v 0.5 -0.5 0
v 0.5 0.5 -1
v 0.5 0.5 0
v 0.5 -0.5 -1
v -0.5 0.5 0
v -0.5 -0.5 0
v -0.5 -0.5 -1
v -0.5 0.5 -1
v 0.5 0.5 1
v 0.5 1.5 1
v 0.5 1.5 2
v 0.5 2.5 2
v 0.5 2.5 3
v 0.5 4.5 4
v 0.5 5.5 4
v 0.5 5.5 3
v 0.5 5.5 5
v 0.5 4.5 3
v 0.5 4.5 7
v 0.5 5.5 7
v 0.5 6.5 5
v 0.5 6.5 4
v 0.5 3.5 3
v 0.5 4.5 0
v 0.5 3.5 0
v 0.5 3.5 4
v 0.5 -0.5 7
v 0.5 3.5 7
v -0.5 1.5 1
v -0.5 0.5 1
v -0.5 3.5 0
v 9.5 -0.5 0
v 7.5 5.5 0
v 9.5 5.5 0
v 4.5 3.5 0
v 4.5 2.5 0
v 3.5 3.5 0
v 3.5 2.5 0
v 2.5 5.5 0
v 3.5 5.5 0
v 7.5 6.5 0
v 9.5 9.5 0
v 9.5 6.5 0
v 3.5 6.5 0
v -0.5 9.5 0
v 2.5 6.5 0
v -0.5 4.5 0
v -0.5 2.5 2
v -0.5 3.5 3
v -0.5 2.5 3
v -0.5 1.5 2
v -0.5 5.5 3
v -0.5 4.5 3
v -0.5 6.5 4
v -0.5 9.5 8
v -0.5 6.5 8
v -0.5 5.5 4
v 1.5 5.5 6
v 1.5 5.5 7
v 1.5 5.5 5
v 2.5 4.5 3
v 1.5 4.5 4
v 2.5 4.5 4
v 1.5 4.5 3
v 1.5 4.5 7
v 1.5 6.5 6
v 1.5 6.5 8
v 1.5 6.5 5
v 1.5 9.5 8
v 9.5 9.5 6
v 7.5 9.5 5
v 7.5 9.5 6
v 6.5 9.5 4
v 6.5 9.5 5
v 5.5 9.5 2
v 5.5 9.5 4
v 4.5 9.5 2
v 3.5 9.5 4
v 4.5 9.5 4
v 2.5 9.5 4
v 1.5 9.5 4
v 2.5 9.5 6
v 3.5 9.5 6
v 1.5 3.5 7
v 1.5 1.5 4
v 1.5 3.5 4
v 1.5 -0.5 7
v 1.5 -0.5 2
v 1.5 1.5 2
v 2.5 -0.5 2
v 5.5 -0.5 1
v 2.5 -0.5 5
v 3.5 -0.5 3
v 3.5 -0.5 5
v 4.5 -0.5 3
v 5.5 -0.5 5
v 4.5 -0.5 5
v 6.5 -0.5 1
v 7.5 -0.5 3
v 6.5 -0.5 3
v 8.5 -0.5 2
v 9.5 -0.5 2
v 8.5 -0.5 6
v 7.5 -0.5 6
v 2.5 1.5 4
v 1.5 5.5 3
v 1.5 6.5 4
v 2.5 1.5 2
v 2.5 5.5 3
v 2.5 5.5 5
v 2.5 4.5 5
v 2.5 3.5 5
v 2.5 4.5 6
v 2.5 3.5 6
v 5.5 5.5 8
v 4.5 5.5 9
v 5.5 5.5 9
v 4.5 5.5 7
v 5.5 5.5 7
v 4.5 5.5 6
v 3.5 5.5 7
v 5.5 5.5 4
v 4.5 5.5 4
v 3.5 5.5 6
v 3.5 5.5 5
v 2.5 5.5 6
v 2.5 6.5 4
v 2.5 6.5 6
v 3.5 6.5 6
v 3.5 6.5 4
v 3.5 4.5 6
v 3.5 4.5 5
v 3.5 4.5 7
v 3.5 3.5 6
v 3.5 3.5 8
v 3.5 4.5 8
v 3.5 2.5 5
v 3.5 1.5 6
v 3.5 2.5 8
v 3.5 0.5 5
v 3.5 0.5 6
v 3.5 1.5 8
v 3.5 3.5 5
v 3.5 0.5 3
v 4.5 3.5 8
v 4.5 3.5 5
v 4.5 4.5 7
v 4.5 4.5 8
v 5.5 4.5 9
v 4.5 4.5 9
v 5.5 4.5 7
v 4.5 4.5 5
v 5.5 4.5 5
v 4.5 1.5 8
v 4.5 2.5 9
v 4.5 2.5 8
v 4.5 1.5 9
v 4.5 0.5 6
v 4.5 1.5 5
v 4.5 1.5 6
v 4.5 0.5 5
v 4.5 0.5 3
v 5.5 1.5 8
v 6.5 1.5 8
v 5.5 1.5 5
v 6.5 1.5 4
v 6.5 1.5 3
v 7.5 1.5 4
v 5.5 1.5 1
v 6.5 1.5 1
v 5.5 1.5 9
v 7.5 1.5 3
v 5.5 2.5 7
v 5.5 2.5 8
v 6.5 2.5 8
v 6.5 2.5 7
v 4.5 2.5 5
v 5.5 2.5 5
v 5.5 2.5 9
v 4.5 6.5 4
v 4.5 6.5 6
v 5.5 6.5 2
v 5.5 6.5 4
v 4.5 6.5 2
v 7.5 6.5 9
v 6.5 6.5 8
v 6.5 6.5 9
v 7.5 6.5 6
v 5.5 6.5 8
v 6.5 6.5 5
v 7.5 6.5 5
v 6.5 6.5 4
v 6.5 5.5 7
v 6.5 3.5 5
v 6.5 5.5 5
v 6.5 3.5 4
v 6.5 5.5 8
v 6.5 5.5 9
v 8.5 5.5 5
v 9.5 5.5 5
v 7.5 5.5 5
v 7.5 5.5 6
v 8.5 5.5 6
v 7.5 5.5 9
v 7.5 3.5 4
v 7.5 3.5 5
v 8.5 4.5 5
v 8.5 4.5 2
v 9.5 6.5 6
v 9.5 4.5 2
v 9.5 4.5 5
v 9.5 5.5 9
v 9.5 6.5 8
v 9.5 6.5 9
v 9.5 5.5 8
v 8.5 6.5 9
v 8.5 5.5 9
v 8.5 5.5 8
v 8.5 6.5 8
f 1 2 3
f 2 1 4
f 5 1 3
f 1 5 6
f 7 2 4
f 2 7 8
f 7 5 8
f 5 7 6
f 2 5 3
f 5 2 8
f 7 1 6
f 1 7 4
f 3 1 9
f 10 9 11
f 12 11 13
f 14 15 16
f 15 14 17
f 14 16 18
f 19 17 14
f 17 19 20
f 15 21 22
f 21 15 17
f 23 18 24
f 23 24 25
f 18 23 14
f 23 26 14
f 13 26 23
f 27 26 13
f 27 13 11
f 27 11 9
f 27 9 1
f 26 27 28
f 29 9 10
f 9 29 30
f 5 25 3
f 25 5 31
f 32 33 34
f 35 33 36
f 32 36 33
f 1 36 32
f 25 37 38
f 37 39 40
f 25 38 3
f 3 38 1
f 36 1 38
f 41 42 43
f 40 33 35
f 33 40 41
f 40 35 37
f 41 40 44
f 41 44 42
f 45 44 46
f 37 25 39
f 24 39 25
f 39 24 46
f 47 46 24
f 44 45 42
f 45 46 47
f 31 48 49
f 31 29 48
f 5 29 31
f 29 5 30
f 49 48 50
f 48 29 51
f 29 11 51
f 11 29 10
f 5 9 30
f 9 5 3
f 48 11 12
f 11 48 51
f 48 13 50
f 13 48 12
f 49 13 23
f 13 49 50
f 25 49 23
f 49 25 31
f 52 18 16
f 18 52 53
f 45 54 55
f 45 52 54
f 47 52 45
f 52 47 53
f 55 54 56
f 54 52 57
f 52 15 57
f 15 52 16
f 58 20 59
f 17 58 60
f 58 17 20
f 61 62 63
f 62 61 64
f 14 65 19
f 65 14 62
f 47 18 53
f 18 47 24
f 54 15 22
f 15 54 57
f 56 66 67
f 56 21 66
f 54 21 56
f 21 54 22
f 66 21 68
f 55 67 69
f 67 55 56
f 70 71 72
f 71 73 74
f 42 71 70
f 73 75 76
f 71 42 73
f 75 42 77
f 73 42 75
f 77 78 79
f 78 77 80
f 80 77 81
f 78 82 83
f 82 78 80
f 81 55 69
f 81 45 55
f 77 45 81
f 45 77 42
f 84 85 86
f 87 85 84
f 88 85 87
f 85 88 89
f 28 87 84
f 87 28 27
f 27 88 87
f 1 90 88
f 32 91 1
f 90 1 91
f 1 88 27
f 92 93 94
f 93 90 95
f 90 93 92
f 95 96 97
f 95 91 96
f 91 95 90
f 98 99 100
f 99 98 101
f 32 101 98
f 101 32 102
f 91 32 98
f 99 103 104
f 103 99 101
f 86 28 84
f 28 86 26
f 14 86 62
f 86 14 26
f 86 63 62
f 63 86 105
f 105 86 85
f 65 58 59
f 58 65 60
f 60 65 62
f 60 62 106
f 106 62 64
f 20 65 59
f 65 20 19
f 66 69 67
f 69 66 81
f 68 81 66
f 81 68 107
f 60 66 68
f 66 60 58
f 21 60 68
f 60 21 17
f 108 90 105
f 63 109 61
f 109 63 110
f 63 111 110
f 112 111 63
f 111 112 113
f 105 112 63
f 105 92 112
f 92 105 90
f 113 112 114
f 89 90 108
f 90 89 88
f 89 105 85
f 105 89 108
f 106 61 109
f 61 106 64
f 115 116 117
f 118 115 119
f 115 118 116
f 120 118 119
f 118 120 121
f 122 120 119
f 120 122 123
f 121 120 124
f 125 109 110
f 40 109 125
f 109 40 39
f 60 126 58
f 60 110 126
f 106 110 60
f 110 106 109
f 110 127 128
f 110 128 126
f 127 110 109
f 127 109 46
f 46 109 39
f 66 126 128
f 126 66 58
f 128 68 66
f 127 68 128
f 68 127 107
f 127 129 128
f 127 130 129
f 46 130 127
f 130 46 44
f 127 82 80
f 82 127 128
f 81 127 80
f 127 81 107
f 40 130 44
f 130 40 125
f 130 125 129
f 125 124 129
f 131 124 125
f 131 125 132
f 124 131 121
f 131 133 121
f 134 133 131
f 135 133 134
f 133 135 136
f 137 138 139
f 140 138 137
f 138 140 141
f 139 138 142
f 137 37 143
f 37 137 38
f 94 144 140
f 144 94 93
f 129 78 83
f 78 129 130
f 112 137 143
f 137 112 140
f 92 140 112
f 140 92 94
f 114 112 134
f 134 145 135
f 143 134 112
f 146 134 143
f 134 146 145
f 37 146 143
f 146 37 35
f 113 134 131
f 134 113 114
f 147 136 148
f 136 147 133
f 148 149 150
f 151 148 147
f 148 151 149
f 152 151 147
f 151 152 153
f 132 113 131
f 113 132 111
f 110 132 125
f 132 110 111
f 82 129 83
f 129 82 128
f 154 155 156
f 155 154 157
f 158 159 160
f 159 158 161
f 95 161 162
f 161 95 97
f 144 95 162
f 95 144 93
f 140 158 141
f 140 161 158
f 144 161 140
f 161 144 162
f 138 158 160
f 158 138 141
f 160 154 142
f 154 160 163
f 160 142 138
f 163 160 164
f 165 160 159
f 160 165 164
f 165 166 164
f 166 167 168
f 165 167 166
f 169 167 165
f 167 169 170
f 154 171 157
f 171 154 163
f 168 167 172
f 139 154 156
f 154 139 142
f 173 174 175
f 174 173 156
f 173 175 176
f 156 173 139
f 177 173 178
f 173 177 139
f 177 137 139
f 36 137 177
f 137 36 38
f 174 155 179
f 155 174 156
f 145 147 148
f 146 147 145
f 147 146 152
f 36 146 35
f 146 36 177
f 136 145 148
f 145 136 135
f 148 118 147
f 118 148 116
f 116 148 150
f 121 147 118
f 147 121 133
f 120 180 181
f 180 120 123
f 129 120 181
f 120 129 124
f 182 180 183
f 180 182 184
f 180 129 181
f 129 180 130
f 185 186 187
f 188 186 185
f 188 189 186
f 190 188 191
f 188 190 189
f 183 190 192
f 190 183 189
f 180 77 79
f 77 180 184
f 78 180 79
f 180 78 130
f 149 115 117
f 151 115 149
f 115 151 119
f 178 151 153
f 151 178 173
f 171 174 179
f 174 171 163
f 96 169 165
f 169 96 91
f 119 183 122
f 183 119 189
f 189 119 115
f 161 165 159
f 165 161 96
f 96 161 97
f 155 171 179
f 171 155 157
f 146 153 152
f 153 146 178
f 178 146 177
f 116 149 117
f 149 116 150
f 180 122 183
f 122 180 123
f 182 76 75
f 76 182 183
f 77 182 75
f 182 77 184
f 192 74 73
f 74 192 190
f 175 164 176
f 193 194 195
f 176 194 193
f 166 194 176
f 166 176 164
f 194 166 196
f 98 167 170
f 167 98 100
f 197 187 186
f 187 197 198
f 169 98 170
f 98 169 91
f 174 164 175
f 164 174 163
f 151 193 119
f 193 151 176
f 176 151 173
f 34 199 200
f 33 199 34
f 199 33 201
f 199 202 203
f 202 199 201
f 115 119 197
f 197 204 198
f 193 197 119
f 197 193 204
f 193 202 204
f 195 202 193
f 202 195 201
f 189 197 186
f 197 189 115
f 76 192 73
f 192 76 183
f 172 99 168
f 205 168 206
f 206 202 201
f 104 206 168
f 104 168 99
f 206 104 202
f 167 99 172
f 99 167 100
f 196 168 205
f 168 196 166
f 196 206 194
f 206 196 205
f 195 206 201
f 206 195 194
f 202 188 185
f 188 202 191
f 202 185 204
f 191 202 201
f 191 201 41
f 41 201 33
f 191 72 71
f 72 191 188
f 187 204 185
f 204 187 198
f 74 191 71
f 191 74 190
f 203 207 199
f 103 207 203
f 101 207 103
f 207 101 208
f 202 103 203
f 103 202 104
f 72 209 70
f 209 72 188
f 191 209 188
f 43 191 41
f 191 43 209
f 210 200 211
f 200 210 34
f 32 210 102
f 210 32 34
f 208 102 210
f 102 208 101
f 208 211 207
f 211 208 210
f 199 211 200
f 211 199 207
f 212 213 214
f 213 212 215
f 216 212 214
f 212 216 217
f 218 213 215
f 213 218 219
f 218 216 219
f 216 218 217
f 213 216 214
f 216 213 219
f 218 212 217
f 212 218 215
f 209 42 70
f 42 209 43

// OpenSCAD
union() {
    translate([0, 0, -0.5]) color([1, 0, 0]) cube([1, 1, 1], center=true);
    translate([0, 1, 0.5]) cube([1, 1, 1], center=true);
    translate([0, 2, 1.0]) cube([1, 1, 2], center=true);
    translate([0, 3, 1.5]) cube([1, 1, 3], center=true);
    translate([0, 5, 1.5]) cube([1, 1, 3], center=true);
    translate([0, 6, 2.0]) cube([1, 1, 4], center=true);
    translate([0, 7, 4.0]) cube([1, 1, 8], center=true);
    translate([0, 8, 4.0]) cube([1, 1, 8], center=true);
    translate([0, 9, 4.0]) cube([1, 1, 8], center=true);
    translate([1, 0, 3.5]) cube([1, 1, 7], center=true);
    translate([1, 1, 3.5]) cube([1, 1, 7], center=true);
    translate([1, 2, 3.5]) cube([1, 1, 7], center=true);
    translate([1, 3, 3.5]) cube([1, 1, 7], center=true);
    translate([1, 4, 2.0]) cube([1, 1, 4], center=true);
    translate([1, 5, 3.5]) cube([1, 1, 7], center=true);
    translate([1, 6, 2.5]) cube([1, 1, 5], center=true);
    translate([1, 7, 4.0]) cube([1, 1, 8], center=true);
    translate([1, 8, 4.0]) cube([1, 1, 8], center=true);
    translate([1, 9, 4.0]) cube([1, 1, 8], center=true);
    translate([2, 0, 1.0]) cube([1, 1, 2], center=true);
    translate([2, 1, 1.0]) cube([1, 1, 2], center=true);
    translate([2, 2, 2.0]) cube([1, 1, 4], center=true);
    translate([2, 3, 2.0]) cube([1, 1, 4], center=true);
    translate([2, 4, 2.0]) cube([1, 1, 4], center=true);
    translate([2, 5, 1.5]) cube([1, 1, 3], center=true);
    translate([2, 6, 3.0]) cube([1, 1, 6], center=true);
    translate([2, 7, 2.0]) cube([1, 1, 4], center=true);
    translate([2, 8, 2.0]) cube([1, 1, 4], center=true);
    translate([2, 9, 2.0]) cube([1, 1, 4], center=true);
    translate([3, 0, 2.5]) cube([1, 1, 5], center=true);
    translate([3, 1, 2.5]) cube([1, 1, 5], center=true);
    translate([3, 2, 2.5]) cube([1, 1, 5], center=true);
    translate([3, 3, 2.5]) cube([1, 1, 5], center=true);
    translate([3, 4, 3.0]) cube([1, 1, 6], center=true);
    translate([3, 5, 2.5]) cube([1, 1, 5], center=true);
    translate([3, 7, 3.0]) cube([1, 1, 6], center=true);
    translate([3, 8, 3.0]) cube([1, 1, 6], center=true);
    translate([3, 9, 3.0]) cube([1, 1, 6], center=true);
    translate([4, 0, 1.5]) cube([1, 1, 3], center=true);
    translate([4, 1, 3.0]) cube([1, 1, 6], center=true);
    translate([4, 2, 4.0]) cube([1, 1, 8], center=true);
    translate([4, 4, 4.0]) cube([1, 1, 8], center=true);
    translate([4, 5, 3.5]) cube([1, 1, 7], center=true);
    translate([4, 6, 3.0]) cube([1, 1, 6], center=true);
    translate([4, 7, 2.0]) cube([1, 1, 4], center=true);
    translate([4, 8, 2.0]) cube([1, 1, 4], center=true);
    translate([4, 9, 2.0]) cube([1, 1, 4], center=true);
    translate([5, 0, 2.5]) cube([1, 1, 5], center=true);
    translate([5, 1, 2.5]) cube([1, 1, 5], center=true);
    translate([5, 2, 4.5]) cube([1, 1, 9], center=true);
    translate([5, 3, 2.5]) cube([1, 1, 5], center=true);
    translate([5, 4, 2.5]) cube([1, 1, 5], center=true);
    translate([5, 5, 4.5]) cube([1, 1, 9], center=true);
    translate([5, 6, 2.0]) cube([1, 1, 4], center=true);
    translate([5, 7, 1.0]) cube([1, 1, 2], center=true);
    translate([5, 8, 1.0]) cube([1, 1, 2], center=true);
    translate([5, 9, 1.0]) cube([1, 1, 2], center=true);
    translate([6, 0, 0.5]) cube([1, 1, 1], center=true);
    translate([6, 1, 0.5]) cube([1, 1, 1], center=true);
    translate([6, 2, 4.0]) cube([1, 1, 8], center=true);
    translate([6, 3, 3.5]) cube([1, 1, 7], center=true);
    translate([6, 4, 3.5]) cube([1, 1, 7], center=true);
    translate([6, 5, 3.5]) cube([1, 1, 7], center=true);
    translate([6, 6, 4.0]) cube([1, 1, 8], center=true);
    translate([6, 7, 2.0]) cube([1, 1, 4], center=true);
    translate([6, 8, 2.0]) cube([1, 1, 4], center=true);
    translate([6, 9, 2.0]) cube([1, 1, 4], center=true);
    translate([7, 0, 1.5]) cube([1, 1, 3], center=true);
    translate([7, 1, 1.5]) cube([1, 1, 3], center=true);
    translate([7, 2, 2.0]) cube([1, 1, 4], center=true);
    translate([7, 3, 2.0]) cube([1, 1, 4], center=true);
    translate([7, 4, 2.5]) cube([1, 1, 5], center=true);
    translate([7, 5, 2.5]) cube([1, 1, 5], center=true);
    translate([7, 6, 4.5]) cube([1, 1, 9], center=true);
    translate([7, 7, 2.5]) cube([1, 1, 5], center=true);
    translate([7, 8, 2.5]) cube([1, 1, 5], center=true);
    translate([7, 9, 2.5]) cube([1, 1, 5], center=true);
    translate([8, 0, 3.0]) cube([1, 1, 6], center=true);
    translate([8, 1, 3.0]) cube([1, 1, 6], center=true);
    translate([8, 2, 3.0]) cube([1, 1, 6], center=true);
    translate([8, 3, 3.0]) cube([1, 1, 6], center=true);
    translate([8, 4, 3.0]) cube([1, 1, 6], center=true);
    translate([8, 5, 3.0]) cube([1, 1, 6], center=true);
    translate([8, 7, 3.0]) cube([1, 1, 6], center=true);
    translate([8, 8, 3.0]) cube([1, 1, 6], center=true);
    translate([8, 9, 3.0]) cube([1, 1, 6], center=true);
    translate([9, 0, 1.0]) cube([1, 1, 2], center=true);
    translate([9, 1, 1.0]) cube([1, 1, 2], center=true);
    translate([9, 2, 1.0]) cube([1, 1, 2], center=true);
    translate([9, 3, 1.0]) cube([1, 1, 2], center=true);
    translate([9, 4, 1.0]) cube([1, 1, 2], center=true);
    translate([9, 5, 2.5]) cube([1, 1, 5], center=true);
    translate([9, 6, 8.5]) color([0, 0, 1]) cube([1, 1, 1], center=true);
    translate([9, 7, 3.0]) cube([1, 1, 6], center=true);
    translate([9, 8, 3.0]) cube([1, 1, 6], center=true);
    translate([9, 9, 3.0]) cube([1, 1, 6], center=true);
}
